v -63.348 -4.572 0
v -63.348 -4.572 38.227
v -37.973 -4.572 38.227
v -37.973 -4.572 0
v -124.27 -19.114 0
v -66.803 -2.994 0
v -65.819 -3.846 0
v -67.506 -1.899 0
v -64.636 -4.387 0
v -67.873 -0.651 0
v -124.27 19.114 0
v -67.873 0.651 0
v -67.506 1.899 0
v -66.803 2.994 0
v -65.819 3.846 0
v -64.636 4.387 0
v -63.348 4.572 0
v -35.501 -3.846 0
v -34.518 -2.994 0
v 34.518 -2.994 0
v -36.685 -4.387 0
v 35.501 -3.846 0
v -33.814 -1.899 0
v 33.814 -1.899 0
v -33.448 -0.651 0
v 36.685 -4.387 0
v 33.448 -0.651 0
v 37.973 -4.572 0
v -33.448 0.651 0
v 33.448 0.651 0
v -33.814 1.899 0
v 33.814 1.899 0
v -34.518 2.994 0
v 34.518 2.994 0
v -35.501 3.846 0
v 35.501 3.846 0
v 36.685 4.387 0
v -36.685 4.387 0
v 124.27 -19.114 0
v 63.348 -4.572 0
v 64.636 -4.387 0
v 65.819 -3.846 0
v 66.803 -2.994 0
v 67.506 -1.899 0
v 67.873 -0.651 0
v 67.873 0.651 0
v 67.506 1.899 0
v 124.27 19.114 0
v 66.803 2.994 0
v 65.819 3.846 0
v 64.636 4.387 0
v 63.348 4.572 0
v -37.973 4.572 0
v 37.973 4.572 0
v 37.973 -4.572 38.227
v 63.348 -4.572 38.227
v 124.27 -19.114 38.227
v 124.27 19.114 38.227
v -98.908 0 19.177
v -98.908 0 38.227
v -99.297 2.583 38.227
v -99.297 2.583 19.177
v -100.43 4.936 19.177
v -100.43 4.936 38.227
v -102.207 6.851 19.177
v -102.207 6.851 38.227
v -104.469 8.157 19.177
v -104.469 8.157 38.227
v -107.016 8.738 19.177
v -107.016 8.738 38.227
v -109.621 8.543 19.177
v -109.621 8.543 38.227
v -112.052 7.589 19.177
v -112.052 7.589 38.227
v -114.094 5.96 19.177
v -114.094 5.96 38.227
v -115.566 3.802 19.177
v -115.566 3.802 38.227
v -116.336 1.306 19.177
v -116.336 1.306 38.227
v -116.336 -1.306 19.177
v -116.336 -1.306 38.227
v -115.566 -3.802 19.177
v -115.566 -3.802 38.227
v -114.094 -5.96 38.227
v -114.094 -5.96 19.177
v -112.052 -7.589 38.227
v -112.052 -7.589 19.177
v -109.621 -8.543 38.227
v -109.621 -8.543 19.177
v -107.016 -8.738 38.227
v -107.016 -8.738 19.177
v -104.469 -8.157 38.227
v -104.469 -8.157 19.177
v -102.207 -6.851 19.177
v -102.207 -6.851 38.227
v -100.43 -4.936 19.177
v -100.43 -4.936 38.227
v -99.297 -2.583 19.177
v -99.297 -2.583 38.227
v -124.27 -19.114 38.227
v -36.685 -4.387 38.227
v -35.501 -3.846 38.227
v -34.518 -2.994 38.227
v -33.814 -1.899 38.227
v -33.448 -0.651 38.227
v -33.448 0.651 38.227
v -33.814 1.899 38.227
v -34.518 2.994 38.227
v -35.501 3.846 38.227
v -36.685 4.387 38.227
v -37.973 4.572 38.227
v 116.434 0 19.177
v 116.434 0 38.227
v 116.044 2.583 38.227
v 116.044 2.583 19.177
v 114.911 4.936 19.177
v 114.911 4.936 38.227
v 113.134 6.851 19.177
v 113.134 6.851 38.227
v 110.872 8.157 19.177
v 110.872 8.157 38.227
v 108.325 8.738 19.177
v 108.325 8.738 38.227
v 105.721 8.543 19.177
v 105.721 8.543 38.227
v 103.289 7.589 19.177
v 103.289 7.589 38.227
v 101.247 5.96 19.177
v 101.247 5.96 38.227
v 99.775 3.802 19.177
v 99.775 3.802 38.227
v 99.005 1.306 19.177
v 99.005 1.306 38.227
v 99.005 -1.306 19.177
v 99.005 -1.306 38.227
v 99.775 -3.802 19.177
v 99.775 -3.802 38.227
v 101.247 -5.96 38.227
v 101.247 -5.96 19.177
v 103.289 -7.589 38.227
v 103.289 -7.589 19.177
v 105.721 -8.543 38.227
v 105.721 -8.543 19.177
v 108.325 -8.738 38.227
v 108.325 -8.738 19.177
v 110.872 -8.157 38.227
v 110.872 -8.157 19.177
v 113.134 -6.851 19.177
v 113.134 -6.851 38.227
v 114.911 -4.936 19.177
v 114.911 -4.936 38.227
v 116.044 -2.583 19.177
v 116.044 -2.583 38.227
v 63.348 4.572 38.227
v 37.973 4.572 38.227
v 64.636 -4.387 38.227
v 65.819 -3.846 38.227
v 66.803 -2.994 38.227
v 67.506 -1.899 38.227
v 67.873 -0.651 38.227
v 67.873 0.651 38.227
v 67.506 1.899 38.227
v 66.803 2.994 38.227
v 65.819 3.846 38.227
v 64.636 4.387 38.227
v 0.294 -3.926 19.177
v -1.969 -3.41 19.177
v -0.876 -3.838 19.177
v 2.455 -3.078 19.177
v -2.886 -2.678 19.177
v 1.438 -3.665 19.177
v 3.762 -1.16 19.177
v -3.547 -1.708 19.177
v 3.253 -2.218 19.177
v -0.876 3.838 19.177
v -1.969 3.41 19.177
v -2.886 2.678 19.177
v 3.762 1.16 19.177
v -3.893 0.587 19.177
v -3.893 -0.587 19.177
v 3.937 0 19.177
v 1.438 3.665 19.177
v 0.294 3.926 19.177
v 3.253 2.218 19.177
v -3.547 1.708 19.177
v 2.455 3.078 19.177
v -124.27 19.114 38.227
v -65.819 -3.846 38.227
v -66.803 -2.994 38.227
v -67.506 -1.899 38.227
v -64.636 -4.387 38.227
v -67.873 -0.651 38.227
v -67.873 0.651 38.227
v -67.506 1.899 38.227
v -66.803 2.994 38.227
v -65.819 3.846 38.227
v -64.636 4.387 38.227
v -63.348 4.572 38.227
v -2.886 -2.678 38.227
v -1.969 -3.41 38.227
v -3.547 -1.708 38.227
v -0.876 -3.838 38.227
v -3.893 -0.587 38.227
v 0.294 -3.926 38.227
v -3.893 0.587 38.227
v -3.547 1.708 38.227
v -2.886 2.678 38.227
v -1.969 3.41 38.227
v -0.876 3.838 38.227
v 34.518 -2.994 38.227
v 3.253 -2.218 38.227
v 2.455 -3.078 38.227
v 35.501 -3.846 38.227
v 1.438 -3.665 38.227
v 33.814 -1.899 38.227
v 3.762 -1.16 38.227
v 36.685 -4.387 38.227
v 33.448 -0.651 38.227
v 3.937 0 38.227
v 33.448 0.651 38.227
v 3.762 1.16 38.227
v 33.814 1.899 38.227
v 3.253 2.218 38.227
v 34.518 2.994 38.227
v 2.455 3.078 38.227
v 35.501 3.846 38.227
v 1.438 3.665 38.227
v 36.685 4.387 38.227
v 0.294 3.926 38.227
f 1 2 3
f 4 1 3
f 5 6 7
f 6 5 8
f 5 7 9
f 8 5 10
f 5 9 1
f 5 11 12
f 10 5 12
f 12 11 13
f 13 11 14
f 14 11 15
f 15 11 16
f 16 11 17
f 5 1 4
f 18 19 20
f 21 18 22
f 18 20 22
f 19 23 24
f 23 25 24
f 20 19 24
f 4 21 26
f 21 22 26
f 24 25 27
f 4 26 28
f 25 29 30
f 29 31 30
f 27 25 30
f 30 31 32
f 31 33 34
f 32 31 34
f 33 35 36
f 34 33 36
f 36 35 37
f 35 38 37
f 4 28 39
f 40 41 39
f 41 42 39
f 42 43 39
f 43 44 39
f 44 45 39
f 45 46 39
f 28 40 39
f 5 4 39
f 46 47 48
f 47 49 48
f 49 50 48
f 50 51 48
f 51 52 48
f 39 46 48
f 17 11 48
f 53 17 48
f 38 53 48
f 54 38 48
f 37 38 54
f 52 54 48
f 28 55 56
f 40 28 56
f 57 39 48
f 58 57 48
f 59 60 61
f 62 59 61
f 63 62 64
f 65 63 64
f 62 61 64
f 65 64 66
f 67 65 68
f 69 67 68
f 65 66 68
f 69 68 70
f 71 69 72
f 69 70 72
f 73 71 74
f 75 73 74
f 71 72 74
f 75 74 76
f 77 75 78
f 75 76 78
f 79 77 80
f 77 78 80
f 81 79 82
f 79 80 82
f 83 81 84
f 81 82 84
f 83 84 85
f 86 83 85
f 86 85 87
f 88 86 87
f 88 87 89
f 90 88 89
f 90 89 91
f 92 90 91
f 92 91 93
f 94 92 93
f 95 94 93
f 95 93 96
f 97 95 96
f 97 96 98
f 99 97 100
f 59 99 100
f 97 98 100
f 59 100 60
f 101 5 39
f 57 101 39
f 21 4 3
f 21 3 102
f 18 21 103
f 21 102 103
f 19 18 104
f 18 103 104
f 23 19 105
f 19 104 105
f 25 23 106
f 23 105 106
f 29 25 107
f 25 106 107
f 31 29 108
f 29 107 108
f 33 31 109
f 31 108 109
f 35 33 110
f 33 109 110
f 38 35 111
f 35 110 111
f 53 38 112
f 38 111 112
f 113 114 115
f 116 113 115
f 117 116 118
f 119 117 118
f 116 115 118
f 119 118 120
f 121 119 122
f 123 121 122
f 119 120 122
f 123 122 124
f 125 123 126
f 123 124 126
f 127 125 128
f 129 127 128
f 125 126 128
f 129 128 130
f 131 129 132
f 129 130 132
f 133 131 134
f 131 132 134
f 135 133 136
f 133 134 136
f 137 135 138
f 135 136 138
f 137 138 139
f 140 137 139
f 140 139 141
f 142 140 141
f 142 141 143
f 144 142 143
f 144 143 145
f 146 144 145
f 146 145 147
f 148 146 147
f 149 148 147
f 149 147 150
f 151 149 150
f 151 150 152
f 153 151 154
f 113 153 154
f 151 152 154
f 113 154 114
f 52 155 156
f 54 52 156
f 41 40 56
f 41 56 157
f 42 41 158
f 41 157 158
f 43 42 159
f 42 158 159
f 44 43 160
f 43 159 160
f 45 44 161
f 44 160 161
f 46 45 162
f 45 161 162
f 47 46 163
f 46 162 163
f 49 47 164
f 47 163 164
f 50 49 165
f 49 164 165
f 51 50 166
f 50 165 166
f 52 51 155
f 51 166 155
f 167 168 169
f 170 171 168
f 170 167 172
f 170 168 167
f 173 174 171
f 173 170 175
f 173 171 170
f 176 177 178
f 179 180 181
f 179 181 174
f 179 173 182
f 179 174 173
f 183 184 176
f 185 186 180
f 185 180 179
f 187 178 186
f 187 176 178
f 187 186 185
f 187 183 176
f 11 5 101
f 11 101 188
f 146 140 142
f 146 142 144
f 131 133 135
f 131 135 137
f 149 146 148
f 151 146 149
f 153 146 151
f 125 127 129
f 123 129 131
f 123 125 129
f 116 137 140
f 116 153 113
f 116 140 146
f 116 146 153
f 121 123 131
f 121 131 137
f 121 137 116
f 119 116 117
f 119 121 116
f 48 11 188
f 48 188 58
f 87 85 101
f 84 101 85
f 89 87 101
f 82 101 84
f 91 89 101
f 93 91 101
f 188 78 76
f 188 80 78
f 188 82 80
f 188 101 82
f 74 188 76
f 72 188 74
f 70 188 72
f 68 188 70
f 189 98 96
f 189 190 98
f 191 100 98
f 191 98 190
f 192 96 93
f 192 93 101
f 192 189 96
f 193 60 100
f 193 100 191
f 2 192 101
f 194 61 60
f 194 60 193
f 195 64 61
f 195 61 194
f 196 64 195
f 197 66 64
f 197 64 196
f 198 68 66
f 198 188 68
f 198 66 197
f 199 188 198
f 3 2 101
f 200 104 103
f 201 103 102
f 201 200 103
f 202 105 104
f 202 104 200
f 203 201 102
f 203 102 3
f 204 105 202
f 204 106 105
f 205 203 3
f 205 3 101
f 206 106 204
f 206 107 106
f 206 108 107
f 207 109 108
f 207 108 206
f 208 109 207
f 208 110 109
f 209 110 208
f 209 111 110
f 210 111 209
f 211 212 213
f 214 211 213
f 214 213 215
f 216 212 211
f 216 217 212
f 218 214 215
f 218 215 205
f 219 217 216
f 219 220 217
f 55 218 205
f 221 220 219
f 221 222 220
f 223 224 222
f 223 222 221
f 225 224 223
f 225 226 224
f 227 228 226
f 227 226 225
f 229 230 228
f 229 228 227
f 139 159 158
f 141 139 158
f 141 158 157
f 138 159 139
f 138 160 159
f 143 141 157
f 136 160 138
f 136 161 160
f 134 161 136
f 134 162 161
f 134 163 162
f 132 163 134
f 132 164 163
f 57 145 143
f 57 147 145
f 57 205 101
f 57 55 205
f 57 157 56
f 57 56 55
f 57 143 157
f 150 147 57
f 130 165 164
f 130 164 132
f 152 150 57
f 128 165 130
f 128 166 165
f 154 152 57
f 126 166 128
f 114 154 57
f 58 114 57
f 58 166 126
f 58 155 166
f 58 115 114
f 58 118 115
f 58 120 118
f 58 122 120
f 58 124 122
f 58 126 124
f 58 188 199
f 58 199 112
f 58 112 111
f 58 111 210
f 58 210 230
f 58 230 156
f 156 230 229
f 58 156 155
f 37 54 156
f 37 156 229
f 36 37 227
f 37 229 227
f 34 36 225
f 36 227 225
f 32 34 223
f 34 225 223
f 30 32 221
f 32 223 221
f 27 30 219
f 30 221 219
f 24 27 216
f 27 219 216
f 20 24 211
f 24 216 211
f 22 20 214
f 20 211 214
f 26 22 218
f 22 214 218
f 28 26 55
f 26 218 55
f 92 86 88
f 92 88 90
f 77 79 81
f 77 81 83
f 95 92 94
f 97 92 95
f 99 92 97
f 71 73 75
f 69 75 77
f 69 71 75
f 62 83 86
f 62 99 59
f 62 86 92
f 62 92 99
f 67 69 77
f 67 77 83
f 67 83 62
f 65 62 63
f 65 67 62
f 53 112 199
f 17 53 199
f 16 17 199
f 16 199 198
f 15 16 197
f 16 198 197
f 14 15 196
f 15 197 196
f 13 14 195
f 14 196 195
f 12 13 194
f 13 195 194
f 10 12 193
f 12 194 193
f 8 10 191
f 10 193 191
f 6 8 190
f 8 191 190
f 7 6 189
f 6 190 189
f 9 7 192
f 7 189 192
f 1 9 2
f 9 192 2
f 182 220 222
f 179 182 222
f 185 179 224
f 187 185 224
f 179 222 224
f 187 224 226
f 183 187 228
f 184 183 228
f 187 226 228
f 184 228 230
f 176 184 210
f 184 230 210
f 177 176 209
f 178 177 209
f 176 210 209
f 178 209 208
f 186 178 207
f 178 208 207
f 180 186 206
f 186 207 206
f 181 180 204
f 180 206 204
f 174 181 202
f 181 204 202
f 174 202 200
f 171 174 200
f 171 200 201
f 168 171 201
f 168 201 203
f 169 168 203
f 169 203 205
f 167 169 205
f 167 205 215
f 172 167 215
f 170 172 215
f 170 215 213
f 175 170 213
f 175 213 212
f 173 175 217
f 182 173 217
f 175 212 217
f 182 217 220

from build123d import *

# Parameters (mm, degrees)
F0_W     = 248.539
F0_H     = 38.227
F1_DEPTH = 38.227
F2_R     = 8.763
F2_R_2   = 3.937
F3_DEPTH = 19.05
F5_DEPTH = 38.228


with BuildPart() as f1:
    # F0 (on Top) → F1 (new body)
    with BuildSketch(Plane.XY):
        Rectangle(F0_W, F0_H)
    extrude(amount=F1_DEPTH)

    # F2 (on face) → F3 (cut)
    with BuildSketch(Plane.XY.offset(38.227)):
        with Locations((-107.6706, 0)):
            Circle(F2_R)
        Circle(F2_R_2)
        with Locations((107.6706, 0)):
            Circle(F2_R)
    extrude(amount=-F3_DEPTH, mode=Mode.SUBTRACT)

    # F4 (on face) → F5 (cut, through all)
    with BuildSketch(Plane.XY.offset(38.227)):
        with BuildLine():
            Line((-37.973, 4.572), (-63.3476, 4.572))
            ThreePointArc((-63.3476, 4.572), (-67.9196, 0), (-63.3476, -4.572))
            Line((-63.3476, -4.572), (-37.973, -4.572))
            ThreePointArc((-37.973, -4.572), (-33.401, 0), (-37.973, 4.572))
        make_face()
        with BuildLine():
            ThreePointArc((37.973, 4.572), (33.401, 0), (37.973, -4.572))
            Line((37.973, -4.572), (63.3476, -4.572))
            ThreePointArc((63.3476, -4.572), (67.9196, 0), (63.3476, 4.572))
            Line((63.3476, 4.572), (37.973, 4.572))
        make_face()
    extrude(amount=-F5_DEPTH, mode=Mode.SUBTRACT)


solid = f1.part
